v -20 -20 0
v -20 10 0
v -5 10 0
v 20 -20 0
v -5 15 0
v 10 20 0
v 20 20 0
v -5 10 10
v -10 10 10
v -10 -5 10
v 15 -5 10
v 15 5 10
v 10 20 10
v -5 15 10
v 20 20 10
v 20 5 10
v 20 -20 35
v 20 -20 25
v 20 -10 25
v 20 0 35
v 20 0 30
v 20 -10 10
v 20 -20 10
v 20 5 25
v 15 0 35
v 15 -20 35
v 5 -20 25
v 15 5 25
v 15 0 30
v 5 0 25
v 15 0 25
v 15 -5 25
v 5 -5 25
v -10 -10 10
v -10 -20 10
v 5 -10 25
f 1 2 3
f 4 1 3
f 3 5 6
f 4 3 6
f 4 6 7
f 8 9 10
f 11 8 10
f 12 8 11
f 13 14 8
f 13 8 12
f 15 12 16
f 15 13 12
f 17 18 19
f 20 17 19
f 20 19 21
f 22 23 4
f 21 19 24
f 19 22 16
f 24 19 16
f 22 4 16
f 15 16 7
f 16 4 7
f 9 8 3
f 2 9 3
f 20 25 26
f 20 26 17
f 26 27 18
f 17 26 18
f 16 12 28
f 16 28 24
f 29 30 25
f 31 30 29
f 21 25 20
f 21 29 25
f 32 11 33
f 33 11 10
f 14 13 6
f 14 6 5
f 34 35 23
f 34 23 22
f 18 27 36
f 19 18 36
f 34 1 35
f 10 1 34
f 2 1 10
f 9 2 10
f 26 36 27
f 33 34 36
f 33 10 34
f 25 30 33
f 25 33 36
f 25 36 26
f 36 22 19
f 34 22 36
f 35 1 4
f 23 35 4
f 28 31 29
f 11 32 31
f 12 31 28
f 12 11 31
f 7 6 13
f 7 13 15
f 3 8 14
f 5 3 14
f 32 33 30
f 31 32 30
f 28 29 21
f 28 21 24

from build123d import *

# Parameters (mm, degrees)
SKETCH1_W           = 40
SKETCH1_H           = 40
BOSS_EXTRUDE1_DEPTH = 10
CUT_EXTRUDE1_DEPTH  = 11
CUT_EXTRUDE2_DEPTH  = 11
SKETCH4_W           = 40
SKETCH4_H           = 20
BOSS_EXTRUDE2_DEPTH = 25
SKETCH5_W           = 15
SKETCH5_H           = 5
CUT_EXTRUDE3_DEPTH  = 41
SKETCH7_W           = 15
SKETCH7_H           = 10
CUT_EXTRUDE4_DEPTH  = 41
CUT_EXTRUDE5_DEPTH  = 31
SKETCH9_W           = 5
SKETCH9_H           = 10
BOSS_EXTRUDE3_DEPTH = 20
CUT_EXTRUDE6_DEPTH  = 6


with BuildPart() as part:
    # Sketch1 → Boss-Extrude1 (new body)
    with BuildSketch(Plane.XY):
        Rectangle(SKETCH1_W, SKETCH1_H)
    extrude(amount=BOSS_EXTRUDE1_DEPTH)

    # Sketch2 → Cut-Extrude1 (cut, through all)
    with BuildSketch(Plane.XY.offset(10)):
        Polygon((10, 20), (-5, 15), (-5, 20), align=None)
    extrude(amount=-CUT_EXTRUDE1_DEPTH, mode=Mode.SUBTRACT)

    # Sketch3 → Cut-Extrude2 (cut, through all)
    with BuildSketch(Plane.XY.offset(10)):
        Polygon((-5, 15), (-5, 10), (-20, 10), (-20, 20), (-5, 20), align=None)
    extrude(amount=-CUT_EXTRUDE2_DEPTH, mode=Mode.SUBTRACT)

    # Sketch4 → Boss-Extrude2 (add)
    with BuildSketch(Plane.XY.offset(10)):
        with Locations((0, -10)):
            Rectangle(SKETCH4_W, SKETCH4_H)
    extrude(amount=BOSS_EXTRUDE2_DEPTH)

    # Sketch5 → Cut-Extrude3 (cut, through all)
    with BuildSketch(Plane.ZY.offset(20)):
        with Locations((17.5, -2.5)):
            Rectangle(SKETCH5_W, SKETCH5_H)
    extrude(amount=-CUT_EXTRUDE3_DEPTH, mode=Mode.SUBTRACT)

    # Sketch7 → Cut-Extrude4 (cut, through all)
    with BuildSketch(Plane.ZY.offset(20)):
        with Locations((17.5, -15)):
            Rectangle(SKETCH7_W, SKETCH7_H)
    extrude(amount=-CUT_EXTRUDE4_DEPTH, mode=Mode.SUBTRACT)

    # Sketch8 → Cut-Extrude5 (cut, through all)
    with BuildSketch(Plane(origin=(0, 10, 0), x_dir=(1, 0, 0), z_dir=(0, 1, 0))):
        Polygon((-20, 0), (15, -35), (-20, -35), align=None)
    extrude(amount=-CUT_EXTRUDE5_DEPTH, mode=Mode.SUBTRACT)

    # Sketch9 → Boss-Extrude3 (add)
    with BuildSketch(Plane.XY.offset(10)):
        with Locations((17.5, 0)):
            Rectangle(SKETCH9_W, SKETCH9_H)
    extrude(amount=BOSS_EXTRUDE3_DEPTH)

    # Sketch10 → Cut-Extrude6 (cut, through all)
    with BuildSketch(Plane.ZY.offset(-15)):
        Polygon((30, 0), (25, 5), (30, 5), align=None)
    extrude(amount=-CUT_EXTRUDE6_DEPTH, mode=Mode.SUBTRACT)


solid = part.part
